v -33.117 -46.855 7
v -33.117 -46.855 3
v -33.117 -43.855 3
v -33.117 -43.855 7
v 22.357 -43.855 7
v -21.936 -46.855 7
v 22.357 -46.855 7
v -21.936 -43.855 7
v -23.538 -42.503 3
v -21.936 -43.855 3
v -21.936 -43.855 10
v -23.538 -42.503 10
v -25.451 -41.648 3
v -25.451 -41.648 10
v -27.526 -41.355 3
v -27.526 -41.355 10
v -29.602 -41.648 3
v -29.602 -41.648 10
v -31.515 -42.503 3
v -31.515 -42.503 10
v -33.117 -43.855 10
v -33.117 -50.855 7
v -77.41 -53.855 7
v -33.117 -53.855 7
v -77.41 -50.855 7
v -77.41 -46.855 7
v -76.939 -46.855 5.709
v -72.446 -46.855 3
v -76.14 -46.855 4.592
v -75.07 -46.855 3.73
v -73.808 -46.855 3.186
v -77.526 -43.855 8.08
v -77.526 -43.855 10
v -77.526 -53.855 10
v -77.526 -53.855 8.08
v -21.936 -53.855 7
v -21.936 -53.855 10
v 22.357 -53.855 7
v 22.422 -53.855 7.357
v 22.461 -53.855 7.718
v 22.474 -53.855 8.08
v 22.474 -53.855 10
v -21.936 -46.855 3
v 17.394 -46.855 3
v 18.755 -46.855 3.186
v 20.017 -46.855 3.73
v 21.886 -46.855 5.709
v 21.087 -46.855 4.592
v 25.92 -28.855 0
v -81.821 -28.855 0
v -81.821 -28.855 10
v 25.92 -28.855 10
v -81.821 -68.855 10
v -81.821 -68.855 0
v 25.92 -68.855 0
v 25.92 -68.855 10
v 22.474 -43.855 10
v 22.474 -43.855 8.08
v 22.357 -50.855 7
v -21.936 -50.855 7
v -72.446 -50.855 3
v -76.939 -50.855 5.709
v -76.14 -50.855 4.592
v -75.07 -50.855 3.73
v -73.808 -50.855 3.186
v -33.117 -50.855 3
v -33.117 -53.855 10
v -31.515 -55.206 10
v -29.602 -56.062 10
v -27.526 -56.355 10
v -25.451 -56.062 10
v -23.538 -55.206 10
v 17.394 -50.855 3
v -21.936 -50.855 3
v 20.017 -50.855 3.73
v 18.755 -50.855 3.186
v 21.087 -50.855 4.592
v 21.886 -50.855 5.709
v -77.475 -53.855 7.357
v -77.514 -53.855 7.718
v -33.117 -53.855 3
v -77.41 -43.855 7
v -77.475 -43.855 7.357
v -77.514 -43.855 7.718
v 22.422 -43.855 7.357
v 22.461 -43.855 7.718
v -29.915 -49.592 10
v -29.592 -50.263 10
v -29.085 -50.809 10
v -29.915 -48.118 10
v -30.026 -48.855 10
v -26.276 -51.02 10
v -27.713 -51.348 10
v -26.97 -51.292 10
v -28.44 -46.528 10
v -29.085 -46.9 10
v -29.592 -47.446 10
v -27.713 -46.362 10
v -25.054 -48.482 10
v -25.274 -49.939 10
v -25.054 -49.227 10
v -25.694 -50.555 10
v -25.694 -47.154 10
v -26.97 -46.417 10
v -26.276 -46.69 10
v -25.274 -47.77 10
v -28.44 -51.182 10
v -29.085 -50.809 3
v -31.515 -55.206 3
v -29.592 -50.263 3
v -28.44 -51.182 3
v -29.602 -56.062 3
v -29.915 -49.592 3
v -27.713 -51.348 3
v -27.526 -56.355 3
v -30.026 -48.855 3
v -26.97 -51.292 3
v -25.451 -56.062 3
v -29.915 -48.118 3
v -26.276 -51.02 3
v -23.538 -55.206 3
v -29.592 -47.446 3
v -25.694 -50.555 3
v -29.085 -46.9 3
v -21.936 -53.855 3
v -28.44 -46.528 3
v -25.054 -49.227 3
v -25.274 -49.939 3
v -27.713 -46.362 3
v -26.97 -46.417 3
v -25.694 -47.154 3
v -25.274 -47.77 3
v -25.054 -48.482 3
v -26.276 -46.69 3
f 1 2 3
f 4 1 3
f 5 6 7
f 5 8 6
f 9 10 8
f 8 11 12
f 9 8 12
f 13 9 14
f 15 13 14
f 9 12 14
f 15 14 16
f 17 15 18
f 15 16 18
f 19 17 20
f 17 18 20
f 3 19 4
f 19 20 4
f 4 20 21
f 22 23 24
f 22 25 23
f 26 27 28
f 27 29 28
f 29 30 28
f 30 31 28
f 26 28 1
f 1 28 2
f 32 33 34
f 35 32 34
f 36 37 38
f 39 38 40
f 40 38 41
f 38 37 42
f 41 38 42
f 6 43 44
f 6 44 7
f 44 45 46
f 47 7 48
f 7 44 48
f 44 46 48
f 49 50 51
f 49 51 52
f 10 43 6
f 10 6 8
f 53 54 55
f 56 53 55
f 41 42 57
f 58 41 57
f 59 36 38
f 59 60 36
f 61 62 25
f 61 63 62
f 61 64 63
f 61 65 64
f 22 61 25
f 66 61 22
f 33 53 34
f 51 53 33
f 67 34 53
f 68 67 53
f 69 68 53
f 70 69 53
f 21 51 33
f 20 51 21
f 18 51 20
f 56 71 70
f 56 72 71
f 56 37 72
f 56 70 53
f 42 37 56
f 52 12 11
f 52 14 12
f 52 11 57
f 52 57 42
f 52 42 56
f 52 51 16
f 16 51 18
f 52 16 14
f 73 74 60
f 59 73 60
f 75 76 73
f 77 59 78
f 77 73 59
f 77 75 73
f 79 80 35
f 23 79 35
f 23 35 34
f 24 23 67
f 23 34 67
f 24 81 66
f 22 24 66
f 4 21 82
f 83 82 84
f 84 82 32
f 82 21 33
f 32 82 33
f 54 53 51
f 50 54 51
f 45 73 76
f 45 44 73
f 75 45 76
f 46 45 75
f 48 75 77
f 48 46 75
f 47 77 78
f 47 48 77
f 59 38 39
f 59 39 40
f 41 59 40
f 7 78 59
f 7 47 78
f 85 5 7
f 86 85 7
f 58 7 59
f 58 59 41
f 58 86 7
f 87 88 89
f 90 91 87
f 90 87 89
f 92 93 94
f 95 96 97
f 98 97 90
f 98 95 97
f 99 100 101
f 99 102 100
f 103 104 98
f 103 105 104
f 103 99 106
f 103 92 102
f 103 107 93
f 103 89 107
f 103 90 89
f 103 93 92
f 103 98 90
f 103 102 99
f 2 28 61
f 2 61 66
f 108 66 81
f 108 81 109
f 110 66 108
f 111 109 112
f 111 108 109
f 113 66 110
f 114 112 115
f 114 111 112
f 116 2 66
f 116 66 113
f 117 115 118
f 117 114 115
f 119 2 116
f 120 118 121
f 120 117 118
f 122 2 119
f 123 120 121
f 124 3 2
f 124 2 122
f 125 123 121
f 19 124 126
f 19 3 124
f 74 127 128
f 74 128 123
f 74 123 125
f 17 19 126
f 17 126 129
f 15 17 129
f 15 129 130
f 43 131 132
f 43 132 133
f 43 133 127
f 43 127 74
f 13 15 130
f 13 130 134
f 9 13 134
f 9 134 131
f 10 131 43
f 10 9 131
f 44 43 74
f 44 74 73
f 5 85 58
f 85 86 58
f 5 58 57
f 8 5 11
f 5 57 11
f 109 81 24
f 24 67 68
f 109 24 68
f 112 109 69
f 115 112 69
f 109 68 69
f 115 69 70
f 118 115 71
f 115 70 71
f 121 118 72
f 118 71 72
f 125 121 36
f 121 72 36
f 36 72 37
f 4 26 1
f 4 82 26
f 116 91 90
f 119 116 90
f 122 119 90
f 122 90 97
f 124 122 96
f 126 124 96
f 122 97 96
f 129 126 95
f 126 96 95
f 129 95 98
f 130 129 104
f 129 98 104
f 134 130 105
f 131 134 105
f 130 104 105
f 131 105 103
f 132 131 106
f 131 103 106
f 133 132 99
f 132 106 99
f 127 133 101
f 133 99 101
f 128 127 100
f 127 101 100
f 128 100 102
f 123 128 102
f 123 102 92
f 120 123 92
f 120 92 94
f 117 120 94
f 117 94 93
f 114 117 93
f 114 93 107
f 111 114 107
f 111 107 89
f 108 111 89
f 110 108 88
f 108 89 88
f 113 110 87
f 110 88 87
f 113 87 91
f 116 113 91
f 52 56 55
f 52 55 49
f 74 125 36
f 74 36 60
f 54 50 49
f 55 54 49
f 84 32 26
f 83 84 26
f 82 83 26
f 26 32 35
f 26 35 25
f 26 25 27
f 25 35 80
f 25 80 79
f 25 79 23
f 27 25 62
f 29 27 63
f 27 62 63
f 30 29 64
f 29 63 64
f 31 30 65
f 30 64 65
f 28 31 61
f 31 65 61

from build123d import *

# Parameters (mm, degrees)
F0_W     = 150
F0_H     = 40
F1_DEPTH = 10
F3_DEPTH = 7
F4_W     = 44.4098300563
F4_H     = 3
F5_DEPTH = 4
F6_R     = 5.08
F7_W     = 20.7056045532
F7_H     = 40
F7_W_2   = 21.5539429337
F8_DEPTH = 25.4


with BuildPart() as f1:
    # F0 (on Top) → F1 (new body)
    with BuildSketch(Plane.XY):
        with Locations((-27.5264725089, -48.8547566533)):
            Rectangle(F0_W, F0_H)
    extrude(amount=F1_DEPTH)

    # F2 (on face) → F3 (cut)
    with BuildSketch(Plane.XY.offset(10)):
        with BuildLine():
            Line((-77.5264725089, -43.8547566533), (-77.5264725089, -48.8547566533))
            Line((-77.5264725089, -48.8547566533), (-77.5264725089, -53.8547566533))
            Line((-77.5264725089, -53.8547566533), (-33.1166424527, -53.8547566533))
            ThreePointArc((-33.1166424527, -53.8547566533), (-27.5264725089, -56.3547566533), (-21.9363025652, -53.8547566533))
            Line((-21.9363025652, -53.8547566533), (22.4735274911, -53.8547566533))
            Line((22.4735274911, -53.8547566533), (22.4735274911, -48.8547566533))
            Line((22.4735274911, -48.8547566533), (22.4735274911, -43.8547566533))
            Line((22.4735274911, -43.8547566533), (-21.9363025652, -43.8547566533))
            ThreePointArc((-21.9363025652, -43.8547566533), (-27.5264725089, -41.3547566533), (-33.1166424527, -43.8547566533))
            Line((-33.1166424527, -43.8547566533), (-77.5264725089, -43.8547566533))
        make_face()
        with BuildLine():
            ThreePointArc((-25.0264725089, -48.8547566533), (-27.5264725089, -51.3547566533), (-30.0264725089, -48.8547566533))
            ThreePointArc((-30.0264725089, -48.8547566533), (-27.5264725089, -46.3547566533), (-25.0264725089, -48.8547566533))
        make_face(mode=Mode.SUBTRACT)
    extrude(amount=-F3_DEPTH, mode=Mode.SUBTRACT)

    # F4 (on face) → F5 (join)
    with BuildSketch(Plane.XY.offset(3)):
        with Locations((-55.3215574808, -45.3547566533)):
            Rectangle(F4_W, F4_H)
        with Locations((-55.3215574808, -52.3547566533)):
            Rectangle(F4_W, F4_H)
        with Locations((0.268612463, -52.3547566533)):
            Rectangle(F4_W, F4_H)
        with Locations((0.268612463, -45.3547566533)):
            Rectangle(F4_W, F4_H)
    extrude(amount=F5_DEPTH)

    # F6
    f6_edges = [f1.edges().sort_by_distance(p)[0] for p in [
        (-77.526473, -48.854757, 3),
        (22.473527, -48.854757, 3),
    ]]
    fillet(f6_edges, radius=F6_R)

    # F7 (on face) → F8 (cut)
    with BuildSketch(Plane.XY.offset(10)):
        with Locations((-92.1736702323, -48.8547566533)):
            Rectangle(F7_W, F7_H)
        with Locations((36.6965560243, -48.8547566533)):
            Rectangle(F7_W_2, F7_H)
    extrude(amount=-F8_DEPTH, mode=Mode.SUBTRACT)


solid = f1.part
